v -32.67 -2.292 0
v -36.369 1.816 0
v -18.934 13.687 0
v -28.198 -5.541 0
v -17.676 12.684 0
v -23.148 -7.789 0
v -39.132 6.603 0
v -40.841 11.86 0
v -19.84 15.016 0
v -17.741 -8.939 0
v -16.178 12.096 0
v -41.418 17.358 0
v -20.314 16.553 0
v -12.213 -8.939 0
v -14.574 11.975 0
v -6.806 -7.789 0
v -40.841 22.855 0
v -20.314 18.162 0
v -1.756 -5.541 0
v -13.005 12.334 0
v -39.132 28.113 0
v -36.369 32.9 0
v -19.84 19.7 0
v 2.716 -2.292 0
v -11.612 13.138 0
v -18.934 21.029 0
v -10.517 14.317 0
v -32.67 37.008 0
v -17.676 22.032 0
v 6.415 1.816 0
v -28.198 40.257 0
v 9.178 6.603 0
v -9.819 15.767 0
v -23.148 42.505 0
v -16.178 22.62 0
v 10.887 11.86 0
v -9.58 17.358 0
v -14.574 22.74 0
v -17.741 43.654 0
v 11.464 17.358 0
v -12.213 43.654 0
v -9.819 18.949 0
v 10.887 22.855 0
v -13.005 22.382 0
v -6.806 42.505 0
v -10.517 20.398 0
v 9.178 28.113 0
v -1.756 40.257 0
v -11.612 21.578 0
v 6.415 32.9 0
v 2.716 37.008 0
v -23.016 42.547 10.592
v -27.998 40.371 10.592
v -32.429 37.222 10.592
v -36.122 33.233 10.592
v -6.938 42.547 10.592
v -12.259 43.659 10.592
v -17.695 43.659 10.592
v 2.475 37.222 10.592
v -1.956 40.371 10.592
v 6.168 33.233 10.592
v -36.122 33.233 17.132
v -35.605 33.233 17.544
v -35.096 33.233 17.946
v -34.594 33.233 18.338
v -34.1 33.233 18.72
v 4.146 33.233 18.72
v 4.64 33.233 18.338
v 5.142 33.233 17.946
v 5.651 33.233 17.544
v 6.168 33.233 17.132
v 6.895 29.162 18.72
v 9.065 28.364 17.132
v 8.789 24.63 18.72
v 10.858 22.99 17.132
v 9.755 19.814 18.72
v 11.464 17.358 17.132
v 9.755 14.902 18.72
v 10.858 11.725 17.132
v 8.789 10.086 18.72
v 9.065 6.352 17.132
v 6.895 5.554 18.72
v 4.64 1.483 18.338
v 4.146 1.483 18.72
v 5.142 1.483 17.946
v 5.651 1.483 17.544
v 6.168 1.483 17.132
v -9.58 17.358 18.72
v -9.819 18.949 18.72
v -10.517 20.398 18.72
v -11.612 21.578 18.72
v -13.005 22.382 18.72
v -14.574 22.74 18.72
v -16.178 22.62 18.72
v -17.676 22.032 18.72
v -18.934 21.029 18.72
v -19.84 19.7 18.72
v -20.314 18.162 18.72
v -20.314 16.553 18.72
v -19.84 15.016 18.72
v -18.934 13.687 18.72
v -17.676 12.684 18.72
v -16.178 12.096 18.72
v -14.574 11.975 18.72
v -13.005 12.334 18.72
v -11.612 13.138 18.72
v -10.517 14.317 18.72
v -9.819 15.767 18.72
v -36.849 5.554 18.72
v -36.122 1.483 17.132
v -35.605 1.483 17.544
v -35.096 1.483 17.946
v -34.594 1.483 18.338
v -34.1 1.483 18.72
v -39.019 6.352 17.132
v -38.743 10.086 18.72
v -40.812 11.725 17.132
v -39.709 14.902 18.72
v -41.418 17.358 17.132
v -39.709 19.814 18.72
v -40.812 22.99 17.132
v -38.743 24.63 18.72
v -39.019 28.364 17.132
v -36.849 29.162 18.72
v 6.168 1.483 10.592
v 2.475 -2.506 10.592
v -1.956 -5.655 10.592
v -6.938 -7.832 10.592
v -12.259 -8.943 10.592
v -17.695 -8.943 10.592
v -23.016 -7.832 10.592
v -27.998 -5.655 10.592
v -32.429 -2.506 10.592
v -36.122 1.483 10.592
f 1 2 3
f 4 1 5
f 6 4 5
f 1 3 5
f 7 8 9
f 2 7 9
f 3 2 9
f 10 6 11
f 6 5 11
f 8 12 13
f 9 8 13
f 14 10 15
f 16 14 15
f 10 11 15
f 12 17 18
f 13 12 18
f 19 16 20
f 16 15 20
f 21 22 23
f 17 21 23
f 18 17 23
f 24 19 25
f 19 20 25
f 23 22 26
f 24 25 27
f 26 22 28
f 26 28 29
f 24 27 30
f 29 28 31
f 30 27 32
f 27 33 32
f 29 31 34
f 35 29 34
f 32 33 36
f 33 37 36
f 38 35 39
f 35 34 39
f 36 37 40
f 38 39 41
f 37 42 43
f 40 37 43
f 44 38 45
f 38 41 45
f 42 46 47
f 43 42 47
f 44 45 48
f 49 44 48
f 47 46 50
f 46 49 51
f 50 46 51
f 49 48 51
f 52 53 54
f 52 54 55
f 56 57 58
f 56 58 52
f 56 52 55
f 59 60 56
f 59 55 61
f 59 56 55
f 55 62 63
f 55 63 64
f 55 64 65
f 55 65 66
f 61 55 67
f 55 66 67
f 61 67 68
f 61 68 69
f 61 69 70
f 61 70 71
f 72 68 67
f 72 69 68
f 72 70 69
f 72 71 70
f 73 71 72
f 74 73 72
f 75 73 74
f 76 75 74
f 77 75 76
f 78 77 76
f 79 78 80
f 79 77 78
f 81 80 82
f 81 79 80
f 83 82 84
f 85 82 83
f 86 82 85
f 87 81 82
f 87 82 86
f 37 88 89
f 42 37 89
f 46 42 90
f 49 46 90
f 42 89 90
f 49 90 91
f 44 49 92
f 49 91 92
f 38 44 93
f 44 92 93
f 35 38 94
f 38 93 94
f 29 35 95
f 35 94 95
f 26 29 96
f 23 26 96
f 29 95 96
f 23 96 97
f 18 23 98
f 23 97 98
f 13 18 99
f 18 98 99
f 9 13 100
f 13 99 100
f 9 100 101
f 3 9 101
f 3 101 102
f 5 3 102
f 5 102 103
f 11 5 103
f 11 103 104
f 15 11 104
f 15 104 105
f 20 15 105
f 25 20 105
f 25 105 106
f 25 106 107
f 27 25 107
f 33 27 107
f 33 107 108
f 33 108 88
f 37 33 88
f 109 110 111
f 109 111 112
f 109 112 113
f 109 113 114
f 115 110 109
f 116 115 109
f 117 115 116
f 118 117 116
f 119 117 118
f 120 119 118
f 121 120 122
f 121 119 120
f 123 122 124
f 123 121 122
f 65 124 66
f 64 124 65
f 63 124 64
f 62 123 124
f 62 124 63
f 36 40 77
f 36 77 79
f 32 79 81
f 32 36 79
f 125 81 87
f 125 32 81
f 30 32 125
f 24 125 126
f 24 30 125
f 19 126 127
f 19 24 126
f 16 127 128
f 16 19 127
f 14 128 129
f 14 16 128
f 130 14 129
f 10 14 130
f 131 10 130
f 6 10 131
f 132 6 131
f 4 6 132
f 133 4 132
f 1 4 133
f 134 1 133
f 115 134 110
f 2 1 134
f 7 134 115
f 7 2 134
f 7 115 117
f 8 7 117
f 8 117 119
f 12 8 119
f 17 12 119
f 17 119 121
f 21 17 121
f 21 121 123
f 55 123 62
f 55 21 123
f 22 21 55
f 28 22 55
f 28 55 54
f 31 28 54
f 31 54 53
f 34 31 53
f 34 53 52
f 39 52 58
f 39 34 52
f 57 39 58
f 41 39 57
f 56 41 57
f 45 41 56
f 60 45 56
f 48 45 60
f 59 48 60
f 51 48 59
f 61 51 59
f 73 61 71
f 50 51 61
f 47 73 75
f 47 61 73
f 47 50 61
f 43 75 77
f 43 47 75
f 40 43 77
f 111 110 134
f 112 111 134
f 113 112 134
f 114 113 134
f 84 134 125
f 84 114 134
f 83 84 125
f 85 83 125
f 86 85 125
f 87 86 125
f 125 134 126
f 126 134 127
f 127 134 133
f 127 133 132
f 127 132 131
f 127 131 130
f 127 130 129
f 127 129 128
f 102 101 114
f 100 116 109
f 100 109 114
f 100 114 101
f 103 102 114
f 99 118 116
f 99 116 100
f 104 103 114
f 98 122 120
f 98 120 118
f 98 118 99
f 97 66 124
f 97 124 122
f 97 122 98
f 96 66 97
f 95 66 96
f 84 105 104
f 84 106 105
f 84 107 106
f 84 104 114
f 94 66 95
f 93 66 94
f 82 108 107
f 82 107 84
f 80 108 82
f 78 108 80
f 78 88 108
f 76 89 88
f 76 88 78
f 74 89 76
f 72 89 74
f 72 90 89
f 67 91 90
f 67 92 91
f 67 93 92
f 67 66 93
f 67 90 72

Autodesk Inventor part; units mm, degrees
ref_plane "YZ Plane" through (0, 0, 0) normal (1, 0, 0) x (0, 1, 0)
ref_plane "XZ Plane" through (0, 0, 0) normal (0, 1, 0) x (-1, 0, 0)
ref_plane "XY Plane" through (0, 0, 0) normal (0, 0, 1) x (1, 0, 0)
sketch "Sketch1" plane through (0, 0, 0) normal (0, 0, 1) x (1, 0, 0)
  circle A0 centre (-14.977, 17.3579) radius 26.4414
  point P0 (0, 0)
  dimension "d0" = 52.8828
extrude "Extrusion1" add sketch "Sketch1" along normal blind 18.7198
chamfer "Chamfer1" distance 1.5875 angle 45 1 edges at (-41.4184, 17.3579, 18.7198)
sketch "Sketch2" plane through (-14.977, 17.3579, 18.7198) normal (0, 0, 1) x (1, 0, 0)
  circle A0 centre (0, 0) radius 24.8539 projected
  circle A1 centre (0, 0) radius 26.4414 projected
  line L0 (-21.1455, -15.875) -> (21.1455, -15.875)
  line L1 (-21.1455, 15.875) -> (21.1455, 15.875)
  arc A2 (21.1455, 15.875) -> (-21.1455, 15.875) centre (0, 0) ccw
  arc A3 (-21.1455, -15.875) -> (21.1455, -15.875) centre (0, 0) ccw
  point P0 (14.977, -17.3579)
  dimension "d6" = 31.75
  dimension "d7" = 15.875
extrude "Extrusion2" cut sketch "Sketch2" against normal blind 8.128 contours L1 A0 | A0 L1 A1 | L0 A1 A0 | A0 L0
sketch "Sketch3" plane through (0, 0, 18.7198) normal (0, 0, 1) x (1, 0, 0)
  arc A0 (-34.1003, 33.2329) -> (-34.1003, 1.4829) centre (-14.977, 17.3579) ccw projected
  circle A1 centre (-14.977, 17.3579) radius 5.3975
  point P0 (0, 0)
  dimension "d10" = 10.795
extrude "Extrusion3" cut sketch "Sketch3" against normal through all
thread "Thread1" size "9/16-12 UNC" class "2B" standard "ANSI Unified Screw Threads" full length
properties part number "Auumulator Cap 1764"
